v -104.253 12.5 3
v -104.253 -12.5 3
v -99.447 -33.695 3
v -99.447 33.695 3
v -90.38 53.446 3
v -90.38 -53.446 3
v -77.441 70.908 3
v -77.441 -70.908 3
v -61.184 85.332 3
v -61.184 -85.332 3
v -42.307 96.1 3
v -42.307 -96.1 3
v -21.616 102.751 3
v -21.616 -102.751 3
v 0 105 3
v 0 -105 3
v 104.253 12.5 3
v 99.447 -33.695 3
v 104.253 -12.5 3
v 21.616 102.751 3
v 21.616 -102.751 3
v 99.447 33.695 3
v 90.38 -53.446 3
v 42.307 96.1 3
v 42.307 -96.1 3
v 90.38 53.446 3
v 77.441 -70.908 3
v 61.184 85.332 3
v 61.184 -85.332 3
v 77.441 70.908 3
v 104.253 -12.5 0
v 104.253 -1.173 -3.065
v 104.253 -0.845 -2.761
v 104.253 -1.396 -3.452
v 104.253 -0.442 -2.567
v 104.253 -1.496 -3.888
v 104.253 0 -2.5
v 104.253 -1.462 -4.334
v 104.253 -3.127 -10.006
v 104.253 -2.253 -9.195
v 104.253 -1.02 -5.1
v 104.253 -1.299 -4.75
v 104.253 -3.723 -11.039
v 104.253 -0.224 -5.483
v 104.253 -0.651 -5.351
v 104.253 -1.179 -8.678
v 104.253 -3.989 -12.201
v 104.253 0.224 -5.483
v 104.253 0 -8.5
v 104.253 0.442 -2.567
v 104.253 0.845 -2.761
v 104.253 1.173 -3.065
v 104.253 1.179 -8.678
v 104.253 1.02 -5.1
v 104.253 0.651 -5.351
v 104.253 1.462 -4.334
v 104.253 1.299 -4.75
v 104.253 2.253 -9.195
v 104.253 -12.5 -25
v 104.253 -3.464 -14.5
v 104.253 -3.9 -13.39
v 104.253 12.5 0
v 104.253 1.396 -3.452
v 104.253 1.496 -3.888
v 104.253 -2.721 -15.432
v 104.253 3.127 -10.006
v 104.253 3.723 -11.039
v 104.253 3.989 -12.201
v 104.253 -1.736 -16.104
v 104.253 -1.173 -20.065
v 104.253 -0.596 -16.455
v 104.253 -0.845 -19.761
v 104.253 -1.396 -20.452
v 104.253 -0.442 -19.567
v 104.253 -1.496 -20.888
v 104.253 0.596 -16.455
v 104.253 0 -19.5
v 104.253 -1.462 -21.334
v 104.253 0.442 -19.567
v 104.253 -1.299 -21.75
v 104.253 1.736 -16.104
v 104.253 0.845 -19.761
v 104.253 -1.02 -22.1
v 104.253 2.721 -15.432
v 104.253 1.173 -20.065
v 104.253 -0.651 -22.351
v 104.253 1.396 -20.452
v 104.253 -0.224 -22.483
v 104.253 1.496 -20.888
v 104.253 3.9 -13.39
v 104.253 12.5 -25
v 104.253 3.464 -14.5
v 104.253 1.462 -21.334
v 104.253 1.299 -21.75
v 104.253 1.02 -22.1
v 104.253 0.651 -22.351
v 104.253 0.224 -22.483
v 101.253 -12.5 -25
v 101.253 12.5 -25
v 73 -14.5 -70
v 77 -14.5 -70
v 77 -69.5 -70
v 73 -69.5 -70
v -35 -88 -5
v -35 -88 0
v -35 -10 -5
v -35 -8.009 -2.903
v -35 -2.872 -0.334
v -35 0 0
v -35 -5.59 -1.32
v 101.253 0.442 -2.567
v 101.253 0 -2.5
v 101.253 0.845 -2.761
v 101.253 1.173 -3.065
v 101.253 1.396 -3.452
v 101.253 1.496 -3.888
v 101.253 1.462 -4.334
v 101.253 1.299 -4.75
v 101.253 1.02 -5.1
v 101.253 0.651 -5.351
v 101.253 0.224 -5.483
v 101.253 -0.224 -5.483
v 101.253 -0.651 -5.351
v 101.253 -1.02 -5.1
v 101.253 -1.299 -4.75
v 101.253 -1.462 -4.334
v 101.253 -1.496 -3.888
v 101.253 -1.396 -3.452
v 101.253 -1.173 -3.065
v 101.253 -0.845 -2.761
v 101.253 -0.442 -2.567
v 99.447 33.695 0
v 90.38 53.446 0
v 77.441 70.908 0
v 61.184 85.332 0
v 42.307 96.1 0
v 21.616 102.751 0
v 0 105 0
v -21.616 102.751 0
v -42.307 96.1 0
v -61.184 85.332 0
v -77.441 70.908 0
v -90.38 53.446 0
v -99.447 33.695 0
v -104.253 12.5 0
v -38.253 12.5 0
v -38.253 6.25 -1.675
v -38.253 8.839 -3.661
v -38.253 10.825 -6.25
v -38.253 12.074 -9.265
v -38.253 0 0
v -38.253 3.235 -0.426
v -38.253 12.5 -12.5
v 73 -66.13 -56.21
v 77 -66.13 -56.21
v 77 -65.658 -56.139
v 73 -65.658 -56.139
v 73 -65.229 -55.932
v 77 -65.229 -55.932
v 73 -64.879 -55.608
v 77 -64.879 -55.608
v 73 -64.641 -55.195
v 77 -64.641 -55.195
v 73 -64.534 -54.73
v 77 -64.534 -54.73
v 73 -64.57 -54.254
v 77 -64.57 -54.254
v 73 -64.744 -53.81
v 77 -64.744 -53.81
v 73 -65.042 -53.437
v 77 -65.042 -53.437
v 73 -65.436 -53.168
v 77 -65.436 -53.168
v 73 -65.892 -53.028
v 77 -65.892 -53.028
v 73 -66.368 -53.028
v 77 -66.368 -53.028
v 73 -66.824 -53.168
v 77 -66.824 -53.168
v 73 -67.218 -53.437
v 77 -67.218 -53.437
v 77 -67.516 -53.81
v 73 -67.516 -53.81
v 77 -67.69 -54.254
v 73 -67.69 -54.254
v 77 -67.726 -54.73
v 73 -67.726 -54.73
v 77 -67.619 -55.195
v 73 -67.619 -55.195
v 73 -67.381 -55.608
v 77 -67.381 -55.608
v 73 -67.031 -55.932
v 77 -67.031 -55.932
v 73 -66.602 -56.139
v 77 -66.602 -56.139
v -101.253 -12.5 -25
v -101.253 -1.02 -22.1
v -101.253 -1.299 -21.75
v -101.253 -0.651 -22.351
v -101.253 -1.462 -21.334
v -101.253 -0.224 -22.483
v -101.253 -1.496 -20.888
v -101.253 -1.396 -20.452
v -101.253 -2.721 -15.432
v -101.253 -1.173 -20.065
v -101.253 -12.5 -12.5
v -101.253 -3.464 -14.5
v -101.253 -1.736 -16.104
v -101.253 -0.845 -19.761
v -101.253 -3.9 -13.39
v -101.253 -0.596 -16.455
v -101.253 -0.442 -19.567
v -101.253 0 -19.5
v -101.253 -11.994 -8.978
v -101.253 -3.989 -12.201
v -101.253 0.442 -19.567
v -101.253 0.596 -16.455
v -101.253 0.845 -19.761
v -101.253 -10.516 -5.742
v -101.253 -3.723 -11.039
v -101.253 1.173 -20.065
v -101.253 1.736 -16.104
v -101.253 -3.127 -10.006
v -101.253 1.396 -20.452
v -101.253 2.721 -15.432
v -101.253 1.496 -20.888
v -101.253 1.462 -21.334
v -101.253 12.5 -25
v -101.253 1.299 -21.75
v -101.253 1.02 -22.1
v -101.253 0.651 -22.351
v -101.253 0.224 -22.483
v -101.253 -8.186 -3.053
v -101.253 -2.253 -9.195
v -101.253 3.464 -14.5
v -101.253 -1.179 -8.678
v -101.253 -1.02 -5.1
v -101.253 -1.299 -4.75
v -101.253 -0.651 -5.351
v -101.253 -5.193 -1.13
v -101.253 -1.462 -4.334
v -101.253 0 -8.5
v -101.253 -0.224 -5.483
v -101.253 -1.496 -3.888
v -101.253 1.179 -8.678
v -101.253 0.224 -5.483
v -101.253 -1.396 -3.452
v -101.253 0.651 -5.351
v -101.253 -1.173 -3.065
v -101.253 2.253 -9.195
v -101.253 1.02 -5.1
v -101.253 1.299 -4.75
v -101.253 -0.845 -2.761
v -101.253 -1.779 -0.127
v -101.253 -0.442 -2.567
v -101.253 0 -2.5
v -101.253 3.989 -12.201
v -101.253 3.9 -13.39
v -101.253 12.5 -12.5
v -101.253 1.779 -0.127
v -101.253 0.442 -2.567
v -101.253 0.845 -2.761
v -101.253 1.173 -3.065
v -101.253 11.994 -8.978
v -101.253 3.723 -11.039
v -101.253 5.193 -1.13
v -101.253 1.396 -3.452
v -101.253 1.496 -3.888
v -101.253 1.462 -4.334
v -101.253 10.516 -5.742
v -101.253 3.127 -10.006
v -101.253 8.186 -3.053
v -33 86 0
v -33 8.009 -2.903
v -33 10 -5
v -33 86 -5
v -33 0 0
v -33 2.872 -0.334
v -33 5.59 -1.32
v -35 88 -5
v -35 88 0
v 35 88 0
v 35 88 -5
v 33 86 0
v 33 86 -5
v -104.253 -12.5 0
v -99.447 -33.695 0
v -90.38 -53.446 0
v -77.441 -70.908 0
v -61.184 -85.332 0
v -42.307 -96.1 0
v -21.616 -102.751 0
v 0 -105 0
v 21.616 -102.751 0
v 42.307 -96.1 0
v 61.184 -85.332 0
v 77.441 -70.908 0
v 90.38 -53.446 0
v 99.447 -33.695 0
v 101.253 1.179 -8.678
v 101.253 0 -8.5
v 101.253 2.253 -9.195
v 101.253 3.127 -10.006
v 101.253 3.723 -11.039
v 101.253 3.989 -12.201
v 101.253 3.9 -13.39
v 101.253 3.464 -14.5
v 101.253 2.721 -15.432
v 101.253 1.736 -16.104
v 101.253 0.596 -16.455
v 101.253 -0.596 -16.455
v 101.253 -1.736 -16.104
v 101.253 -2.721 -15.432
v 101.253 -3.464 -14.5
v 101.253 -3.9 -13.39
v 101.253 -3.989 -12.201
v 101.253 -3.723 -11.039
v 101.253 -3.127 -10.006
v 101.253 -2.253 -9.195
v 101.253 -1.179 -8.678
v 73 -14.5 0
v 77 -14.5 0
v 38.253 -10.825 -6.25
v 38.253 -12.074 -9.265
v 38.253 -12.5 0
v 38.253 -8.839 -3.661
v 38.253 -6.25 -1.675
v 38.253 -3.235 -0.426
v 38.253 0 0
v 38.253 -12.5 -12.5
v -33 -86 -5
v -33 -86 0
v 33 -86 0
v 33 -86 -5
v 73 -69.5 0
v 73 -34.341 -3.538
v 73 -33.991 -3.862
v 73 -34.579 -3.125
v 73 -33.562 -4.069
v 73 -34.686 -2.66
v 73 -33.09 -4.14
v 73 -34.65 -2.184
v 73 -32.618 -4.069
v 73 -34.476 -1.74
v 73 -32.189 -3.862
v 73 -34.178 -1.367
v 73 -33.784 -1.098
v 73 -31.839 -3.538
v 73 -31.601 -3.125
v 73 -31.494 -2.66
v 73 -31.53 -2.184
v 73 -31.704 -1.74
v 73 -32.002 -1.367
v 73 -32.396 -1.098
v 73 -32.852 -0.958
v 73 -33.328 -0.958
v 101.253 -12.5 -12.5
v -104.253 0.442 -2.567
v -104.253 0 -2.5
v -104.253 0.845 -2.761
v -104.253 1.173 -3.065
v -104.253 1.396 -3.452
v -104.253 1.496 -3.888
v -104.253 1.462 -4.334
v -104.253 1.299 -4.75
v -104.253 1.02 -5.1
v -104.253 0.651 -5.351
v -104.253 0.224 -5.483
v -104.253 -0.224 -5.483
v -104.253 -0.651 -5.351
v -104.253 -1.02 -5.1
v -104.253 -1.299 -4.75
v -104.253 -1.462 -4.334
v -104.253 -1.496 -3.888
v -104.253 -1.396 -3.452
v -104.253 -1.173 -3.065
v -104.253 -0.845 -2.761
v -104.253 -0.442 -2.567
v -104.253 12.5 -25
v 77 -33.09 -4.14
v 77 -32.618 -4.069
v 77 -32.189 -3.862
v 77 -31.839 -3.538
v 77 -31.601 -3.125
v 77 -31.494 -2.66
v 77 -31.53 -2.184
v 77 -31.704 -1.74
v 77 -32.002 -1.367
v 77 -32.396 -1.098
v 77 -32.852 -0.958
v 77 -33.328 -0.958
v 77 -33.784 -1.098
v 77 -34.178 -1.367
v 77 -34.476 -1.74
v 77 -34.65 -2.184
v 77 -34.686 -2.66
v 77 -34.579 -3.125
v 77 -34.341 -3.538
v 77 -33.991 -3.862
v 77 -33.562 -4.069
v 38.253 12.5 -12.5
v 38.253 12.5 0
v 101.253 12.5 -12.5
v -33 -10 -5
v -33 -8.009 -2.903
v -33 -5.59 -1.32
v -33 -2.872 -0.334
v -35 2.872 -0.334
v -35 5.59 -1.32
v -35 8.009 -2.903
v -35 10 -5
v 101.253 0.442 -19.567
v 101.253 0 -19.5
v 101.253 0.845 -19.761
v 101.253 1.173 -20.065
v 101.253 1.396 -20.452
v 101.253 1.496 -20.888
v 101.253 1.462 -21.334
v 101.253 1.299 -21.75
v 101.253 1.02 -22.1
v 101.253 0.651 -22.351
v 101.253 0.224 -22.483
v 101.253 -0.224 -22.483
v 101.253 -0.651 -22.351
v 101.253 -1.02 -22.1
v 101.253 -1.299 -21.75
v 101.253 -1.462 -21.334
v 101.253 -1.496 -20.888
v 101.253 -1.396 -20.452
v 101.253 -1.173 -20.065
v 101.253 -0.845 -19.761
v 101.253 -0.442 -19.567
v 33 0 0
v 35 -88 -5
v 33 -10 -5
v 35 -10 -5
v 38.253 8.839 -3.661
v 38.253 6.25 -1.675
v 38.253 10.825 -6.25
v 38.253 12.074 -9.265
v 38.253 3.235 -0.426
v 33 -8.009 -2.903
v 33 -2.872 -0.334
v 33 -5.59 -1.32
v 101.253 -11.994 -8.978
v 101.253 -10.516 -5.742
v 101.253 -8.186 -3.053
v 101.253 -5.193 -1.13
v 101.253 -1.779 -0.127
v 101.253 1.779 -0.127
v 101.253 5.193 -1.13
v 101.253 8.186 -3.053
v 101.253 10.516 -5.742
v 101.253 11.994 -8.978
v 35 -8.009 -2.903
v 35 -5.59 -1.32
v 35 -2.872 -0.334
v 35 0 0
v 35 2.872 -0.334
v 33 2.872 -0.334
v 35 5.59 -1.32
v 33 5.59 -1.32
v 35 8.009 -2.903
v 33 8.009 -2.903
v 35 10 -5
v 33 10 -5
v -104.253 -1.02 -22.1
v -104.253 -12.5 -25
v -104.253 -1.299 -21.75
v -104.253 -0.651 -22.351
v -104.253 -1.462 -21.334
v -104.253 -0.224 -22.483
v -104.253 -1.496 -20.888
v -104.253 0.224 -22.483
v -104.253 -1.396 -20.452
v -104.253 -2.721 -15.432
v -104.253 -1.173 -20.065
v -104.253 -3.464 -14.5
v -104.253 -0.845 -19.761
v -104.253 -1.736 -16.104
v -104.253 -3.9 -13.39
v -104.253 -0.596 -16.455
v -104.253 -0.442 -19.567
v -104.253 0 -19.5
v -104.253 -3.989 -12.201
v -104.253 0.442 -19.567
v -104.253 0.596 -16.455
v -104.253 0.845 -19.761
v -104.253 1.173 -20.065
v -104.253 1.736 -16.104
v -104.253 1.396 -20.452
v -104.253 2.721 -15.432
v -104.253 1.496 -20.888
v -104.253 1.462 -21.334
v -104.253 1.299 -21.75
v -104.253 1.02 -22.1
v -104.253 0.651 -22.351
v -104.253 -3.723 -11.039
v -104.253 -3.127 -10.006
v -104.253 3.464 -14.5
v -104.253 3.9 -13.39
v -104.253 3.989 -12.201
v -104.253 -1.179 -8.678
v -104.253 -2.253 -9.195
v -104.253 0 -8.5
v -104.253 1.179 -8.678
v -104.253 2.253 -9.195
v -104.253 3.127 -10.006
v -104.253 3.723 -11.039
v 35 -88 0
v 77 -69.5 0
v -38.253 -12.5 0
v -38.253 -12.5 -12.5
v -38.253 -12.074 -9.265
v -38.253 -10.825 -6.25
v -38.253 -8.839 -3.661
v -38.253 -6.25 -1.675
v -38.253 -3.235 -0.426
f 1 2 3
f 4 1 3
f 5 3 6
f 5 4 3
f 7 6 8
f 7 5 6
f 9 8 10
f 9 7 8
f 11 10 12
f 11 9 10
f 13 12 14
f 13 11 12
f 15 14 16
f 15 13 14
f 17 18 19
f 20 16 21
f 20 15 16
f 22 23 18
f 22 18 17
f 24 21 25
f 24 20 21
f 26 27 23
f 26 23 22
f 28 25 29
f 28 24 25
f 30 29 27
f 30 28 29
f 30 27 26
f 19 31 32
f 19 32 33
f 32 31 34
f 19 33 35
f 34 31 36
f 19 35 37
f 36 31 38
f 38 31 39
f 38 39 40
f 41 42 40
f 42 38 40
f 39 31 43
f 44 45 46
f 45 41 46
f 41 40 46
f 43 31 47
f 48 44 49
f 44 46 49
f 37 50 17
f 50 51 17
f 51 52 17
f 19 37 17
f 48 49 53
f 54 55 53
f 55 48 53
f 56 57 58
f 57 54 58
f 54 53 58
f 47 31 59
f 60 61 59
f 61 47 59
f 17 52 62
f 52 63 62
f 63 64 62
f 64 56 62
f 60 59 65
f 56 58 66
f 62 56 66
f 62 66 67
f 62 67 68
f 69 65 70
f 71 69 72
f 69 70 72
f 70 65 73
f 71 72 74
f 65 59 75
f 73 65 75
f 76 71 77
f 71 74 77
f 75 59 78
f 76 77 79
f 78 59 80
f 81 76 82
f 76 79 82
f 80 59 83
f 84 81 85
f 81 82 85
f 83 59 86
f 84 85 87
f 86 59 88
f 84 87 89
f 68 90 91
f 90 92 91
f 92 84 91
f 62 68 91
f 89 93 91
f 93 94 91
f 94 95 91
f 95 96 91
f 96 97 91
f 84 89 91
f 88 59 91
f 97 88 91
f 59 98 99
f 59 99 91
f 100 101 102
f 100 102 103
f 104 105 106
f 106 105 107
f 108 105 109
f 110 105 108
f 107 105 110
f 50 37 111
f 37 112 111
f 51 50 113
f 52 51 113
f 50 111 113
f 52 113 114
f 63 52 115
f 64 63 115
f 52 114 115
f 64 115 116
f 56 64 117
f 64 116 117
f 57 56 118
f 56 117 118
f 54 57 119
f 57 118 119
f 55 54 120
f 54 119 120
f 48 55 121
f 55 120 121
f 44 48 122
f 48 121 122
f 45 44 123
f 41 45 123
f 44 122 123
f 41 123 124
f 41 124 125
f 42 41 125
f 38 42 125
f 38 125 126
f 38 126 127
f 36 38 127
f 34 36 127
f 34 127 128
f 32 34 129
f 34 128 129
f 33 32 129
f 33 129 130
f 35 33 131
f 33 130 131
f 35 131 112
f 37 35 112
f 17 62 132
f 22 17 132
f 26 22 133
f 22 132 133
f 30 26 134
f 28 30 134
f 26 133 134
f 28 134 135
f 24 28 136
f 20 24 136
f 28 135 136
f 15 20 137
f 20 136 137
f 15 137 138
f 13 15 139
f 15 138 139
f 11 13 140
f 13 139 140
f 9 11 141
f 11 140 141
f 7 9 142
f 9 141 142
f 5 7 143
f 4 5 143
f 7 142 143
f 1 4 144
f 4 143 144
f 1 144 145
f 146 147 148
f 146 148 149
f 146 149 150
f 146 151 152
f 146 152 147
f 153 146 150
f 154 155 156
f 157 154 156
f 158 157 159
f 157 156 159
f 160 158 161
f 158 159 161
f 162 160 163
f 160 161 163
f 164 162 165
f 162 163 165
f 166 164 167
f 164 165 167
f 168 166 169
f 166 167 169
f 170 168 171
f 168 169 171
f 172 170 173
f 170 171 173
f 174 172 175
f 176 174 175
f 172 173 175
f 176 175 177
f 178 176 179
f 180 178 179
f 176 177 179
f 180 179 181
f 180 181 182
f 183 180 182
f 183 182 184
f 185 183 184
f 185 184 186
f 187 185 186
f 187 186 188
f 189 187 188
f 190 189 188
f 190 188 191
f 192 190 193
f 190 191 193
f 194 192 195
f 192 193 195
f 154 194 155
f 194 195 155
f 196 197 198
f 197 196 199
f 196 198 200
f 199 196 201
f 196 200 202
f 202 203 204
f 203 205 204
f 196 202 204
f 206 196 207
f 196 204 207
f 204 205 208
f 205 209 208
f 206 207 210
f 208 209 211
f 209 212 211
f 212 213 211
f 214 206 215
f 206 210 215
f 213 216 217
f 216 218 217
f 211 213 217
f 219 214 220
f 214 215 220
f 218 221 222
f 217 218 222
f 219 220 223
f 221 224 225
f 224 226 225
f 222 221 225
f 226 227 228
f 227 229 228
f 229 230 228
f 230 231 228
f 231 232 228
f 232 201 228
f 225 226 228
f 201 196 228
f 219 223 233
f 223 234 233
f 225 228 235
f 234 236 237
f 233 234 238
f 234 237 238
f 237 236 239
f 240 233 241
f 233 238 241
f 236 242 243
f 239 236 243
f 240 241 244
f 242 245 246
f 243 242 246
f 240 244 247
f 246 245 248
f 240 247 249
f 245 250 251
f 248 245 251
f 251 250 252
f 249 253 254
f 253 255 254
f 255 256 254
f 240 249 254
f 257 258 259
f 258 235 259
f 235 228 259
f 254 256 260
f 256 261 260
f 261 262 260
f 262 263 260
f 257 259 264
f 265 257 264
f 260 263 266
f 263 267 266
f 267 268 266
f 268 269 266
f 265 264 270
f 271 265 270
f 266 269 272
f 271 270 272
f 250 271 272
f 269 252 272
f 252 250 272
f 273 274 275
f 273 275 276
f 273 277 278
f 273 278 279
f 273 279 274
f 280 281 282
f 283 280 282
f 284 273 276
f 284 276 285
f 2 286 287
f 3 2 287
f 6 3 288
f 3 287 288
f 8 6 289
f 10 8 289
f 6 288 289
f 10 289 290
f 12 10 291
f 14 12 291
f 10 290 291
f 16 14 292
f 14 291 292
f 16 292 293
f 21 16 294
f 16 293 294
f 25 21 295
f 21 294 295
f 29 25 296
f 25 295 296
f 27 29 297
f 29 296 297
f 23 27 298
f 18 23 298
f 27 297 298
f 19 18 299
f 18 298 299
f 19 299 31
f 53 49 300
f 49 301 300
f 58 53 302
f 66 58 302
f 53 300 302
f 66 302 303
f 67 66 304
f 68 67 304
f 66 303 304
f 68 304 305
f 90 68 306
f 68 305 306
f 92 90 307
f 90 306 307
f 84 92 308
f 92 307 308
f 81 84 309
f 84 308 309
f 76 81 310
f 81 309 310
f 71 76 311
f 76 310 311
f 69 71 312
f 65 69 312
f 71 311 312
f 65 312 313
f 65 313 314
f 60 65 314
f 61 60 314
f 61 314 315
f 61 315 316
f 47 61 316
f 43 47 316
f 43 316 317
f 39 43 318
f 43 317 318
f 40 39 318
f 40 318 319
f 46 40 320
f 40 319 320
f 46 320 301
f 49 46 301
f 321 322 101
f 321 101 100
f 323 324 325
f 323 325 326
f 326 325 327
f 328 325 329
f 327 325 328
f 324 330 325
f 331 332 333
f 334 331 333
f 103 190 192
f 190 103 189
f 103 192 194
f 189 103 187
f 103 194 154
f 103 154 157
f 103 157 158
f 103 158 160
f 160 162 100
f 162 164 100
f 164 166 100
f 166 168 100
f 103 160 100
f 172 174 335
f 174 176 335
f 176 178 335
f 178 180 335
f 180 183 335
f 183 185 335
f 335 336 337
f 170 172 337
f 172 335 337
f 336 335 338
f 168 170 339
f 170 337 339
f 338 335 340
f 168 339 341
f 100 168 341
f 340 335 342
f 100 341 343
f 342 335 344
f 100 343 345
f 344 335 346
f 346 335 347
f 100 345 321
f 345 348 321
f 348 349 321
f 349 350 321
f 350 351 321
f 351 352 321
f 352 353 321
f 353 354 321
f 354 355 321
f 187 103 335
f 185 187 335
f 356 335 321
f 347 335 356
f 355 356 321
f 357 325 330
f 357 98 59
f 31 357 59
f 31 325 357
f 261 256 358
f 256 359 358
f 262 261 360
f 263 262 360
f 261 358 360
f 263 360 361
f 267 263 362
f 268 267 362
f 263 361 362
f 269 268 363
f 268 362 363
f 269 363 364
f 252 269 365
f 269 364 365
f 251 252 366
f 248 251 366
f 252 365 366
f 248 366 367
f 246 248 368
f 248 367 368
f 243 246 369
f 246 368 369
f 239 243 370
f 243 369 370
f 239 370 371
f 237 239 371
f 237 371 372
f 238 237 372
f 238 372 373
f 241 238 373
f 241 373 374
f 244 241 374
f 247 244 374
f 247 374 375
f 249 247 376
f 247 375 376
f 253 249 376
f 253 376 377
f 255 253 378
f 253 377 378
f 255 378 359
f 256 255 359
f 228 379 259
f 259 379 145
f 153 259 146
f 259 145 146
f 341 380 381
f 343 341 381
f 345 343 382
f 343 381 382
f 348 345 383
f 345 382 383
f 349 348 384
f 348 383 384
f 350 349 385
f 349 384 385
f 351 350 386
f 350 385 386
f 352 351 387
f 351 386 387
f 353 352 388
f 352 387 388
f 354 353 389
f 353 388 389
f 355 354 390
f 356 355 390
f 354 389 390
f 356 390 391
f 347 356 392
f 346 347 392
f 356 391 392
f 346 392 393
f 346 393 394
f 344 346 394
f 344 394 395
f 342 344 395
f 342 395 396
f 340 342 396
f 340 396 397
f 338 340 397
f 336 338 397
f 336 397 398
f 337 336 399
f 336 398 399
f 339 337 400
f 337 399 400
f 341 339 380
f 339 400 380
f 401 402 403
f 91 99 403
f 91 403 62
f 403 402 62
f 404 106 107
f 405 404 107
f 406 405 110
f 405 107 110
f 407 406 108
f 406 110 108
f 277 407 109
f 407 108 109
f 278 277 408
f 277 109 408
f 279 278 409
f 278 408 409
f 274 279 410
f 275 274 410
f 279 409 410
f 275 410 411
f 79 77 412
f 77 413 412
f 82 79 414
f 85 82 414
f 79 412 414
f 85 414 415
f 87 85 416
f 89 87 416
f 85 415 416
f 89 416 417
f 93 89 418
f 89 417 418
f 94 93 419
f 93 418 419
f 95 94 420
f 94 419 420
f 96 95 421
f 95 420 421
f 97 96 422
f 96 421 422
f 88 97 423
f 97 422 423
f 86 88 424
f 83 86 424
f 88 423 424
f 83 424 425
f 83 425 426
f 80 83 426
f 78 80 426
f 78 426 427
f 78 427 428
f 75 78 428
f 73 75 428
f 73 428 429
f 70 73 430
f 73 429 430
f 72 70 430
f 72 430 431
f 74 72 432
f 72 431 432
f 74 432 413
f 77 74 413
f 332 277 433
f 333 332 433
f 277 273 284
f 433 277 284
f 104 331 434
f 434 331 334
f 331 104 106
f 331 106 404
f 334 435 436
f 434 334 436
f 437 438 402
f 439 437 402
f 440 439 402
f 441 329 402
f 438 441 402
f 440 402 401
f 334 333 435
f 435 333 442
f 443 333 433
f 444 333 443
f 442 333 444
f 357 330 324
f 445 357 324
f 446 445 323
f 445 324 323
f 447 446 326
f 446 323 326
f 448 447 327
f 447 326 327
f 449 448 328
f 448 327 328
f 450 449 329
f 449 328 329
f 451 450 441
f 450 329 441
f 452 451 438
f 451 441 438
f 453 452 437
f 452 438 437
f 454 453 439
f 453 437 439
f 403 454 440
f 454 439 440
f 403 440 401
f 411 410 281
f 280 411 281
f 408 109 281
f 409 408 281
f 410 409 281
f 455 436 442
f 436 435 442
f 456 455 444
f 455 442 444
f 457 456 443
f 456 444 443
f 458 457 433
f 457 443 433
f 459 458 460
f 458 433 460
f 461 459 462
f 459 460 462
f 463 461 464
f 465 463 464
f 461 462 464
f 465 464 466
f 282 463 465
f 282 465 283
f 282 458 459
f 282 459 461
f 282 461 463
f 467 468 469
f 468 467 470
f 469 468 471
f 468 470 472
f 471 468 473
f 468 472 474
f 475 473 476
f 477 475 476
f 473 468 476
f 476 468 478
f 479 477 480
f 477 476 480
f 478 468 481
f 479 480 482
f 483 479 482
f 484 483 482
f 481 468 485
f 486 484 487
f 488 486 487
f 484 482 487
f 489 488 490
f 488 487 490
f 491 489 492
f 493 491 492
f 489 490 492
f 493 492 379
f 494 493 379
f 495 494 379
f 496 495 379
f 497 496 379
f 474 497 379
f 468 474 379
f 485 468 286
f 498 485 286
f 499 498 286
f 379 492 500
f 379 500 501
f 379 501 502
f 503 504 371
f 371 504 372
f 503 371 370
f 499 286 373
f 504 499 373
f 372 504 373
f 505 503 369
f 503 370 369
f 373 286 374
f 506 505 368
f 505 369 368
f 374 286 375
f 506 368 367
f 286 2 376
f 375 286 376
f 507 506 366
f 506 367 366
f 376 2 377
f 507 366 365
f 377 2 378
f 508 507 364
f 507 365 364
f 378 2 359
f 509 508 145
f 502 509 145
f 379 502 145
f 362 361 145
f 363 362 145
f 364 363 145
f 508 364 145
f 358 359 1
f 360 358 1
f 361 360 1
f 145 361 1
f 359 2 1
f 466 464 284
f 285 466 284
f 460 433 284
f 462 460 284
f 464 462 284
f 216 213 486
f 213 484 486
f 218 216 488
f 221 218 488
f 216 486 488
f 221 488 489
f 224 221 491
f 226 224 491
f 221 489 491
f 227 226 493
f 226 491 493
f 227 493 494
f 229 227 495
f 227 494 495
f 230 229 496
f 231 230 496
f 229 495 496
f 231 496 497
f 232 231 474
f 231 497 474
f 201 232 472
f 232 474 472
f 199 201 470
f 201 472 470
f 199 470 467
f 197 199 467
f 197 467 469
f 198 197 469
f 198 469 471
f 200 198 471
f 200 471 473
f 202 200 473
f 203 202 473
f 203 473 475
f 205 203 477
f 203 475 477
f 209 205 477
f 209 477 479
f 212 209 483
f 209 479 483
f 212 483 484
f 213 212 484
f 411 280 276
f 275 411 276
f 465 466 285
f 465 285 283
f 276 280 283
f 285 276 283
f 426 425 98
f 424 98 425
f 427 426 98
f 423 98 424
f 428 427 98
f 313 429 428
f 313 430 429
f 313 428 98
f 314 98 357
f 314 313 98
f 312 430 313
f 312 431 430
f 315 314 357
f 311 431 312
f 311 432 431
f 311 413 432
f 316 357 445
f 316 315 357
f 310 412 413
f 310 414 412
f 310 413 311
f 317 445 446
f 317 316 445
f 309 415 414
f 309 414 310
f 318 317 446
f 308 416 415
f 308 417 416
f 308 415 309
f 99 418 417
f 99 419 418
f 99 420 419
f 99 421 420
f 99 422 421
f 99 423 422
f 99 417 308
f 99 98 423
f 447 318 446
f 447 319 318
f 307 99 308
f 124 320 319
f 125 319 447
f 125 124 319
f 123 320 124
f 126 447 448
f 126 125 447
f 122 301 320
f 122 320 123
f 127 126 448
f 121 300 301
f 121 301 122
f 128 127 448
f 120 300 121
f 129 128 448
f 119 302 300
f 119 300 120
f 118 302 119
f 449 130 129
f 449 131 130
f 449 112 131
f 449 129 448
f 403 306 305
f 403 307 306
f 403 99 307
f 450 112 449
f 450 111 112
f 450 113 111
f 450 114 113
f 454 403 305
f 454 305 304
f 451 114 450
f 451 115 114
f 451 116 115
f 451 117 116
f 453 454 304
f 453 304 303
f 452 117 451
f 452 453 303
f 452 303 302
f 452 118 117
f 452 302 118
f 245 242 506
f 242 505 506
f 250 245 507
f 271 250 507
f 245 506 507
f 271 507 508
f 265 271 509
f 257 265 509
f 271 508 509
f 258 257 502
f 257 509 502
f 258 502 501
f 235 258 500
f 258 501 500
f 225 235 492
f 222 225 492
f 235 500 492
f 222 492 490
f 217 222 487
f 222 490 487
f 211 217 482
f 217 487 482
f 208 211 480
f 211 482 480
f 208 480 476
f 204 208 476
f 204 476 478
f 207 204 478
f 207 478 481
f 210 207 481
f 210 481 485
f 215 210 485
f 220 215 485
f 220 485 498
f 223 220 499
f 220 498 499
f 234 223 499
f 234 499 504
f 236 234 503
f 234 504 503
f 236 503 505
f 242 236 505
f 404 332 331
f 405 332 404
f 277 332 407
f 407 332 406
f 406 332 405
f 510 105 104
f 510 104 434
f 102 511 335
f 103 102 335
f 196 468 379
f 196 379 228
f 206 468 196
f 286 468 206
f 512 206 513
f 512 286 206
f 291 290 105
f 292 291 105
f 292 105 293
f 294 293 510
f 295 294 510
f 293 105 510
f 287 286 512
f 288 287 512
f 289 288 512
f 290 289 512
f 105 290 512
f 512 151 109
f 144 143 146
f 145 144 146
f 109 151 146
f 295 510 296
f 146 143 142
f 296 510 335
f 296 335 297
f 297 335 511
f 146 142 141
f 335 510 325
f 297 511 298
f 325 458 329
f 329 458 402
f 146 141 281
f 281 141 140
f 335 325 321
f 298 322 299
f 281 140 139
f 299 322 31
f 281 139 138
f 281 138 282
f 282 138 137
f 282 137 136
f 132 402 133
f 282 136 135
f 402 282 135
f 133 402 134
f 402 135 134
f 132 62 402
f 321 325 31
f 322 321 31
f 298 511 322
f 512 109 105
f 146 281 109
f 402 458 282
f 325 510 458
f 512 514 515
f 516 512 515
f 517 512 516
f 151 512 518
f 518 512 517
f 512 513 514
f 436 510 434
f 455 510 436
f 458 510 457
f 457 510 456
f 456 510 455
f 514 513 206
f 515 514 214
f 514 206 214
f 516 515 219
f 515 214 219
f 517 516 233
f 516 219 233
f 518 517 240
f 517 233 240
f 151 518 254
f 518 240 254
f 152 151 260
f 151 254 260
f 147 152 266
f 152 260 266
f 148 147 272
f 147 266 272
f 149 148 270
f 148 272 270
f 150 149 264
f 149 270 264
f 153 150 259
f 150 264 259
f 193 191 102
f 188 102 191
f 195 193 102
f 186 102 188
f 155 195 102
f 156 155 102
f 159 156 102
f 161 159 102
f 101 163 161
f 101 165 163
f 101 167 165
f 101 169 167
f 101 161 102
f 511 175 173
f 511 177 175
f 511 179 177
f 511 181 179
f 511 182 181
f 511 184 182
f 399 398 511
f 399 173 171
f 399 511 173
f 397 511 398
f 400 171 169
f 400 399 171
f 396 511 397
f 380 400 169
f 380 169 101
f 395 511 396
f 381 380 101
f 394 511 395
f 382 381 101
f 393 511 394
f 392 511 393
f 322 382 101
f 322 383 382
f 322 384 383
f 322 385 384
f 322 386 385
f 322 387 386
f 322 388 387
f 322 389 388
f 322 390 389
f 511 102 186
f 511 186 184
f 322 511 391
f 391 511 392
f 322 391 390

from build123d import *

# Parameters (mm, degrees)
BOSS_EXTRUDE1_DEPTH     = 3
SKETCH1_3_W             = 70
SKETCH1_3_H             = 176
SKETCH1_3_W_2           = 66
SKETCH1_3_H_2           = 172
BOSS_EXTRUDE2_DEPTH     = 5
SKETCH1_4_W             = 66
SKETCH1_4_H             = 25
BOSS_EXTRUDE3_DEPTH     = 25
CUT_EXTRUDE1_START      = -3
SKETCH2_R               = 12.5
SKETCH2_R_2             = 1.5
CUT_EXTRUDE1_DEPTH      = 202.50659462
SKETCH2_4_R             = 1.5
SKETCH2_4_R_2           = 4
CUT_EXTRUDE2_DEPTH      = 1
CUT_EXTRUDE2_DEPTH_BACK = 209.50659462
SKETCH5_R               = 14.5
CUT_EXTRUDE3_DEPTH      = 15.5
SKETCH6_W               = 4
SKETCH6_H               = 55
BOSS_EXTRUDE4_DEPTH     = 70
SKETCH7_R               = 1.6
CUT_EXTRUDE4_DEPTH      = 4


with BuildPart() as part:
    # Sketch1 → Boss-Extrude1 (new body)
    with BuildSketch(Plane.XY):
        with BuildLine():
            ThreePointArc((104.25329731, 12.5), (0, 105), (-104.25329731, 12.5))
            Line((-104.25329731, 12.5), (-104.25329731, -12.5))
            ThreePointArc((-104.25329731, -12.5), (0, -105), (104.25329731, -12.5))
            Line((104.25329731, -12.5), (104.25329731, 12.5))
        make_face()
    extrude(amount=BOSS_EXTRUDE1_DEPTH)

    # Sketch1_3 → Boss-Extrude2 (add)
    with BuildSketch(Plane.XY):
        Rectangle(SKETCH1_3_W, SKETCH1_3_H)
        Rectangle(SKETCH1_3_W_2, SKETCH1_3_H_2, mode=Mode.SUBTRACT)
    extrude(amount=-BOSS_EXTRUDE2_DEPTH)

    # Sketch1_4 → Boss-Extrude3 (add)
    with BuildSketch(Plane.XY):
        with Locations((-71.25329731, 0)):
            Rectangle(SKETCH1_4_W, SKETCH1_4_H)
        with Locations((71.25329731, 0)):
            Rectangle(SKETCH1_4_W, SKETCH1_4_H)
    extrude(amount=-BOSS_EXTRUDE3_DEPTH)

    # Sketch2 → Cut-Extrude1 (cut)
    with BuildSketch(Plane.ZY.offset(104.25329731).offset(CUT_EXTRUDE1_START)):
        with Locations((-12.5, 0)):
            Circle(SKETCH2_R)
        with Locations((-4, 0)):
            Circle(SKETCH2_R_2, mode=Mode.SUBTRACT)
        with Locations((-21, 0)):
            Circle(SKETCH2_R_2, mode=Mode.SUBTRACT)
        with BuildLine():
            ThreePointArc((-25, 2.5e-08), (-21.338834756, 8.838834774), (-12.5, 12.5))
            Line((-12.5, 12.5), (-25, 12.5))
            Line((-25, 12.5), (-25, 2.5e-08))
        make_face()
        with BuildLine():
            ThreePointArc((-12.5, -12.5), (-21.338834774, -8.838834756), (-25, 2.5e-08))
            Line((-25, 2.5e-08), (-25, -12.5))
            Line((-25, -12.5), (-12.5, -12.5))
        make_face()
    extrude(amount=-CUT_EXTRUDE1_DEPTH, mode=Mode.SUBTRACT)


with BuildPart() as cut_extrude1_piece_1:
    # of the 3 separate pieces the step leaves, piece 1, a body of its own (cut_extrude1_pieces)
    add(part.part.solids().sort_by_distance((104.25329731, -12.5, 0))[0])


with BuildPart() as cut_extrude1_piece_2:
    # of the 3 separate pieces the step leaves, piece 2, a body of its own (cut_extrude1_pieces)
    add(part.part.solids().sort_by_distance((-35, -1.118033989, -5))[0])


with BuildPart() as cut_extrude1_piece_3:
    # of the 3 separate pieces the step leaves, piece 3, a body of its own (cut_extrude1_pieces)
    add(part.part.solids().sort_by_distance((35, 1.118033989, -5))[0])


with BuildPart() as cut_extrude2_tool:
    # Sketch2_4 → Cut-Extrude2 (new, two sides)
    with BuildSketch(Plane.ZY.offset(104.25329731)) as cut_extrude2_sk:
        with Locations((-21, 0)):
            Circle(SKETCH2_4_R)
        with Locations((-4, 0)):
            Circle(SKETCH2_4_R)
        with Locations((-12.5, 0)):
            Circle(SKETCH2_4_R_2)
    extrude(amount=CUT_EXTRUDE2_DEPTH)
    extrude(cut_extrude2_sk.sketch, amount=-CUT_EXTRUDE2_DEPTH_BACK)


with BuildPart() as cut_extrude1_piece_1_1:
    add(cut_extrude1_piece_1.part)

    # Cut-Extrude2: cut by cut_extrude2_tool
    add(cut_extrude2_tool.part, mode=Mode.SUBTRACT)

    # Sketch4 one side → Revolve1 (revolve)
    with BuildSketch(Plane(origin=(0, 0, 0), x_dir=(0, 0, -1), z_dir=(1, 0, 0))):
        with BuildLine():
            Line((-17.5, 90.5), (-3, 90.5))
            Line((-3, 90.5), (-3, 105))
            ThreePointArc((-3, 105), (-13.253048327, 100.753048327), (-17.5, 90.5))
        make_face()
    revolve(axis=Axis((0, 90.5, 17.5), (0, 0, -1)))

    # Sketch4_4 one side → Revolve2 (revolve)
    with BuildSketch(Plane(origin=(0, 0, 0), x_dir=(0, 0, -1), z_dir=(1, 0, 0))):
        with BuildLine():
            Line((-17.5, -90.5), (-3, -90.5))
            Line((-3, -90.5), (-3, -76))
            ThreePointArc((-3, -76), (-13.253048327, -80.246951673), (-17.5, -90.5))
        make_face()
    revolve(axis=Axis((0, -90.5, 17.5), (0, 0, -1)))

    # Sketch5 → Cut-Extrude3 (cut, through all)
    with BuildSketch(Plane.XY.offset(3)):
        with Locations((0, -90.5)):
            Circle(SKETCH5_R)
        with Locations((0, 90.5)):
            Circle(SKETCH5_R)
    extrude(amount=CUT_EXTRUDE3_DEPTH, mode=Mode.SUBTRACT)

    # Sketch6 → Boss-Extrude4 (add)
    with BuildSketch(Plane(origin=(0, 0, 0), x_dir=(-1, 0, 0), z_dir=(0, 0, -1))):
        with Locations((-75, -42)):
            Rectangle(SKETCH6_W, SKETCH6_H)
    extrude(amount=BOSS_EXTRUDE4_DEPTH)

    # Sketch7 → Cut-Extrude4 (cut)
    with BuildSketch(Plane(origin=(77, 0, 0), x_dir=(0, 0, -1), z_dir=(1, 0, 0))):
        with Locations((2.54, -33.09)):
            Circle(SKETCH7_R)
        with Locations((54.61, -66.13)):
            Circle(SKETCH7_R)
    extrude(amount=-CUT_EXTRUDE4_DEPTH, mode=Mode.SUBTRACT)


with BuildPart() as cut_extrude1_piece_2_1:
    add(cut_extrude1_piece_2.part)

    # Cut-Extrude2: cut by cut_extrude2_tool
    add(cut_extrude2_tool.part, mode=Mode.SUBTRACT)


with BuildPart() as cut_extrude1_piece_3_1:
    add(cut_extrude1_piece_3.part)

    # Cut-Extrude2: cut by cut_extrude2_tool
    add(cut_extrude2_tool.part, mode=Mode.SUBTRACT)


solid = cut_extrude1_piece_1_1.part
